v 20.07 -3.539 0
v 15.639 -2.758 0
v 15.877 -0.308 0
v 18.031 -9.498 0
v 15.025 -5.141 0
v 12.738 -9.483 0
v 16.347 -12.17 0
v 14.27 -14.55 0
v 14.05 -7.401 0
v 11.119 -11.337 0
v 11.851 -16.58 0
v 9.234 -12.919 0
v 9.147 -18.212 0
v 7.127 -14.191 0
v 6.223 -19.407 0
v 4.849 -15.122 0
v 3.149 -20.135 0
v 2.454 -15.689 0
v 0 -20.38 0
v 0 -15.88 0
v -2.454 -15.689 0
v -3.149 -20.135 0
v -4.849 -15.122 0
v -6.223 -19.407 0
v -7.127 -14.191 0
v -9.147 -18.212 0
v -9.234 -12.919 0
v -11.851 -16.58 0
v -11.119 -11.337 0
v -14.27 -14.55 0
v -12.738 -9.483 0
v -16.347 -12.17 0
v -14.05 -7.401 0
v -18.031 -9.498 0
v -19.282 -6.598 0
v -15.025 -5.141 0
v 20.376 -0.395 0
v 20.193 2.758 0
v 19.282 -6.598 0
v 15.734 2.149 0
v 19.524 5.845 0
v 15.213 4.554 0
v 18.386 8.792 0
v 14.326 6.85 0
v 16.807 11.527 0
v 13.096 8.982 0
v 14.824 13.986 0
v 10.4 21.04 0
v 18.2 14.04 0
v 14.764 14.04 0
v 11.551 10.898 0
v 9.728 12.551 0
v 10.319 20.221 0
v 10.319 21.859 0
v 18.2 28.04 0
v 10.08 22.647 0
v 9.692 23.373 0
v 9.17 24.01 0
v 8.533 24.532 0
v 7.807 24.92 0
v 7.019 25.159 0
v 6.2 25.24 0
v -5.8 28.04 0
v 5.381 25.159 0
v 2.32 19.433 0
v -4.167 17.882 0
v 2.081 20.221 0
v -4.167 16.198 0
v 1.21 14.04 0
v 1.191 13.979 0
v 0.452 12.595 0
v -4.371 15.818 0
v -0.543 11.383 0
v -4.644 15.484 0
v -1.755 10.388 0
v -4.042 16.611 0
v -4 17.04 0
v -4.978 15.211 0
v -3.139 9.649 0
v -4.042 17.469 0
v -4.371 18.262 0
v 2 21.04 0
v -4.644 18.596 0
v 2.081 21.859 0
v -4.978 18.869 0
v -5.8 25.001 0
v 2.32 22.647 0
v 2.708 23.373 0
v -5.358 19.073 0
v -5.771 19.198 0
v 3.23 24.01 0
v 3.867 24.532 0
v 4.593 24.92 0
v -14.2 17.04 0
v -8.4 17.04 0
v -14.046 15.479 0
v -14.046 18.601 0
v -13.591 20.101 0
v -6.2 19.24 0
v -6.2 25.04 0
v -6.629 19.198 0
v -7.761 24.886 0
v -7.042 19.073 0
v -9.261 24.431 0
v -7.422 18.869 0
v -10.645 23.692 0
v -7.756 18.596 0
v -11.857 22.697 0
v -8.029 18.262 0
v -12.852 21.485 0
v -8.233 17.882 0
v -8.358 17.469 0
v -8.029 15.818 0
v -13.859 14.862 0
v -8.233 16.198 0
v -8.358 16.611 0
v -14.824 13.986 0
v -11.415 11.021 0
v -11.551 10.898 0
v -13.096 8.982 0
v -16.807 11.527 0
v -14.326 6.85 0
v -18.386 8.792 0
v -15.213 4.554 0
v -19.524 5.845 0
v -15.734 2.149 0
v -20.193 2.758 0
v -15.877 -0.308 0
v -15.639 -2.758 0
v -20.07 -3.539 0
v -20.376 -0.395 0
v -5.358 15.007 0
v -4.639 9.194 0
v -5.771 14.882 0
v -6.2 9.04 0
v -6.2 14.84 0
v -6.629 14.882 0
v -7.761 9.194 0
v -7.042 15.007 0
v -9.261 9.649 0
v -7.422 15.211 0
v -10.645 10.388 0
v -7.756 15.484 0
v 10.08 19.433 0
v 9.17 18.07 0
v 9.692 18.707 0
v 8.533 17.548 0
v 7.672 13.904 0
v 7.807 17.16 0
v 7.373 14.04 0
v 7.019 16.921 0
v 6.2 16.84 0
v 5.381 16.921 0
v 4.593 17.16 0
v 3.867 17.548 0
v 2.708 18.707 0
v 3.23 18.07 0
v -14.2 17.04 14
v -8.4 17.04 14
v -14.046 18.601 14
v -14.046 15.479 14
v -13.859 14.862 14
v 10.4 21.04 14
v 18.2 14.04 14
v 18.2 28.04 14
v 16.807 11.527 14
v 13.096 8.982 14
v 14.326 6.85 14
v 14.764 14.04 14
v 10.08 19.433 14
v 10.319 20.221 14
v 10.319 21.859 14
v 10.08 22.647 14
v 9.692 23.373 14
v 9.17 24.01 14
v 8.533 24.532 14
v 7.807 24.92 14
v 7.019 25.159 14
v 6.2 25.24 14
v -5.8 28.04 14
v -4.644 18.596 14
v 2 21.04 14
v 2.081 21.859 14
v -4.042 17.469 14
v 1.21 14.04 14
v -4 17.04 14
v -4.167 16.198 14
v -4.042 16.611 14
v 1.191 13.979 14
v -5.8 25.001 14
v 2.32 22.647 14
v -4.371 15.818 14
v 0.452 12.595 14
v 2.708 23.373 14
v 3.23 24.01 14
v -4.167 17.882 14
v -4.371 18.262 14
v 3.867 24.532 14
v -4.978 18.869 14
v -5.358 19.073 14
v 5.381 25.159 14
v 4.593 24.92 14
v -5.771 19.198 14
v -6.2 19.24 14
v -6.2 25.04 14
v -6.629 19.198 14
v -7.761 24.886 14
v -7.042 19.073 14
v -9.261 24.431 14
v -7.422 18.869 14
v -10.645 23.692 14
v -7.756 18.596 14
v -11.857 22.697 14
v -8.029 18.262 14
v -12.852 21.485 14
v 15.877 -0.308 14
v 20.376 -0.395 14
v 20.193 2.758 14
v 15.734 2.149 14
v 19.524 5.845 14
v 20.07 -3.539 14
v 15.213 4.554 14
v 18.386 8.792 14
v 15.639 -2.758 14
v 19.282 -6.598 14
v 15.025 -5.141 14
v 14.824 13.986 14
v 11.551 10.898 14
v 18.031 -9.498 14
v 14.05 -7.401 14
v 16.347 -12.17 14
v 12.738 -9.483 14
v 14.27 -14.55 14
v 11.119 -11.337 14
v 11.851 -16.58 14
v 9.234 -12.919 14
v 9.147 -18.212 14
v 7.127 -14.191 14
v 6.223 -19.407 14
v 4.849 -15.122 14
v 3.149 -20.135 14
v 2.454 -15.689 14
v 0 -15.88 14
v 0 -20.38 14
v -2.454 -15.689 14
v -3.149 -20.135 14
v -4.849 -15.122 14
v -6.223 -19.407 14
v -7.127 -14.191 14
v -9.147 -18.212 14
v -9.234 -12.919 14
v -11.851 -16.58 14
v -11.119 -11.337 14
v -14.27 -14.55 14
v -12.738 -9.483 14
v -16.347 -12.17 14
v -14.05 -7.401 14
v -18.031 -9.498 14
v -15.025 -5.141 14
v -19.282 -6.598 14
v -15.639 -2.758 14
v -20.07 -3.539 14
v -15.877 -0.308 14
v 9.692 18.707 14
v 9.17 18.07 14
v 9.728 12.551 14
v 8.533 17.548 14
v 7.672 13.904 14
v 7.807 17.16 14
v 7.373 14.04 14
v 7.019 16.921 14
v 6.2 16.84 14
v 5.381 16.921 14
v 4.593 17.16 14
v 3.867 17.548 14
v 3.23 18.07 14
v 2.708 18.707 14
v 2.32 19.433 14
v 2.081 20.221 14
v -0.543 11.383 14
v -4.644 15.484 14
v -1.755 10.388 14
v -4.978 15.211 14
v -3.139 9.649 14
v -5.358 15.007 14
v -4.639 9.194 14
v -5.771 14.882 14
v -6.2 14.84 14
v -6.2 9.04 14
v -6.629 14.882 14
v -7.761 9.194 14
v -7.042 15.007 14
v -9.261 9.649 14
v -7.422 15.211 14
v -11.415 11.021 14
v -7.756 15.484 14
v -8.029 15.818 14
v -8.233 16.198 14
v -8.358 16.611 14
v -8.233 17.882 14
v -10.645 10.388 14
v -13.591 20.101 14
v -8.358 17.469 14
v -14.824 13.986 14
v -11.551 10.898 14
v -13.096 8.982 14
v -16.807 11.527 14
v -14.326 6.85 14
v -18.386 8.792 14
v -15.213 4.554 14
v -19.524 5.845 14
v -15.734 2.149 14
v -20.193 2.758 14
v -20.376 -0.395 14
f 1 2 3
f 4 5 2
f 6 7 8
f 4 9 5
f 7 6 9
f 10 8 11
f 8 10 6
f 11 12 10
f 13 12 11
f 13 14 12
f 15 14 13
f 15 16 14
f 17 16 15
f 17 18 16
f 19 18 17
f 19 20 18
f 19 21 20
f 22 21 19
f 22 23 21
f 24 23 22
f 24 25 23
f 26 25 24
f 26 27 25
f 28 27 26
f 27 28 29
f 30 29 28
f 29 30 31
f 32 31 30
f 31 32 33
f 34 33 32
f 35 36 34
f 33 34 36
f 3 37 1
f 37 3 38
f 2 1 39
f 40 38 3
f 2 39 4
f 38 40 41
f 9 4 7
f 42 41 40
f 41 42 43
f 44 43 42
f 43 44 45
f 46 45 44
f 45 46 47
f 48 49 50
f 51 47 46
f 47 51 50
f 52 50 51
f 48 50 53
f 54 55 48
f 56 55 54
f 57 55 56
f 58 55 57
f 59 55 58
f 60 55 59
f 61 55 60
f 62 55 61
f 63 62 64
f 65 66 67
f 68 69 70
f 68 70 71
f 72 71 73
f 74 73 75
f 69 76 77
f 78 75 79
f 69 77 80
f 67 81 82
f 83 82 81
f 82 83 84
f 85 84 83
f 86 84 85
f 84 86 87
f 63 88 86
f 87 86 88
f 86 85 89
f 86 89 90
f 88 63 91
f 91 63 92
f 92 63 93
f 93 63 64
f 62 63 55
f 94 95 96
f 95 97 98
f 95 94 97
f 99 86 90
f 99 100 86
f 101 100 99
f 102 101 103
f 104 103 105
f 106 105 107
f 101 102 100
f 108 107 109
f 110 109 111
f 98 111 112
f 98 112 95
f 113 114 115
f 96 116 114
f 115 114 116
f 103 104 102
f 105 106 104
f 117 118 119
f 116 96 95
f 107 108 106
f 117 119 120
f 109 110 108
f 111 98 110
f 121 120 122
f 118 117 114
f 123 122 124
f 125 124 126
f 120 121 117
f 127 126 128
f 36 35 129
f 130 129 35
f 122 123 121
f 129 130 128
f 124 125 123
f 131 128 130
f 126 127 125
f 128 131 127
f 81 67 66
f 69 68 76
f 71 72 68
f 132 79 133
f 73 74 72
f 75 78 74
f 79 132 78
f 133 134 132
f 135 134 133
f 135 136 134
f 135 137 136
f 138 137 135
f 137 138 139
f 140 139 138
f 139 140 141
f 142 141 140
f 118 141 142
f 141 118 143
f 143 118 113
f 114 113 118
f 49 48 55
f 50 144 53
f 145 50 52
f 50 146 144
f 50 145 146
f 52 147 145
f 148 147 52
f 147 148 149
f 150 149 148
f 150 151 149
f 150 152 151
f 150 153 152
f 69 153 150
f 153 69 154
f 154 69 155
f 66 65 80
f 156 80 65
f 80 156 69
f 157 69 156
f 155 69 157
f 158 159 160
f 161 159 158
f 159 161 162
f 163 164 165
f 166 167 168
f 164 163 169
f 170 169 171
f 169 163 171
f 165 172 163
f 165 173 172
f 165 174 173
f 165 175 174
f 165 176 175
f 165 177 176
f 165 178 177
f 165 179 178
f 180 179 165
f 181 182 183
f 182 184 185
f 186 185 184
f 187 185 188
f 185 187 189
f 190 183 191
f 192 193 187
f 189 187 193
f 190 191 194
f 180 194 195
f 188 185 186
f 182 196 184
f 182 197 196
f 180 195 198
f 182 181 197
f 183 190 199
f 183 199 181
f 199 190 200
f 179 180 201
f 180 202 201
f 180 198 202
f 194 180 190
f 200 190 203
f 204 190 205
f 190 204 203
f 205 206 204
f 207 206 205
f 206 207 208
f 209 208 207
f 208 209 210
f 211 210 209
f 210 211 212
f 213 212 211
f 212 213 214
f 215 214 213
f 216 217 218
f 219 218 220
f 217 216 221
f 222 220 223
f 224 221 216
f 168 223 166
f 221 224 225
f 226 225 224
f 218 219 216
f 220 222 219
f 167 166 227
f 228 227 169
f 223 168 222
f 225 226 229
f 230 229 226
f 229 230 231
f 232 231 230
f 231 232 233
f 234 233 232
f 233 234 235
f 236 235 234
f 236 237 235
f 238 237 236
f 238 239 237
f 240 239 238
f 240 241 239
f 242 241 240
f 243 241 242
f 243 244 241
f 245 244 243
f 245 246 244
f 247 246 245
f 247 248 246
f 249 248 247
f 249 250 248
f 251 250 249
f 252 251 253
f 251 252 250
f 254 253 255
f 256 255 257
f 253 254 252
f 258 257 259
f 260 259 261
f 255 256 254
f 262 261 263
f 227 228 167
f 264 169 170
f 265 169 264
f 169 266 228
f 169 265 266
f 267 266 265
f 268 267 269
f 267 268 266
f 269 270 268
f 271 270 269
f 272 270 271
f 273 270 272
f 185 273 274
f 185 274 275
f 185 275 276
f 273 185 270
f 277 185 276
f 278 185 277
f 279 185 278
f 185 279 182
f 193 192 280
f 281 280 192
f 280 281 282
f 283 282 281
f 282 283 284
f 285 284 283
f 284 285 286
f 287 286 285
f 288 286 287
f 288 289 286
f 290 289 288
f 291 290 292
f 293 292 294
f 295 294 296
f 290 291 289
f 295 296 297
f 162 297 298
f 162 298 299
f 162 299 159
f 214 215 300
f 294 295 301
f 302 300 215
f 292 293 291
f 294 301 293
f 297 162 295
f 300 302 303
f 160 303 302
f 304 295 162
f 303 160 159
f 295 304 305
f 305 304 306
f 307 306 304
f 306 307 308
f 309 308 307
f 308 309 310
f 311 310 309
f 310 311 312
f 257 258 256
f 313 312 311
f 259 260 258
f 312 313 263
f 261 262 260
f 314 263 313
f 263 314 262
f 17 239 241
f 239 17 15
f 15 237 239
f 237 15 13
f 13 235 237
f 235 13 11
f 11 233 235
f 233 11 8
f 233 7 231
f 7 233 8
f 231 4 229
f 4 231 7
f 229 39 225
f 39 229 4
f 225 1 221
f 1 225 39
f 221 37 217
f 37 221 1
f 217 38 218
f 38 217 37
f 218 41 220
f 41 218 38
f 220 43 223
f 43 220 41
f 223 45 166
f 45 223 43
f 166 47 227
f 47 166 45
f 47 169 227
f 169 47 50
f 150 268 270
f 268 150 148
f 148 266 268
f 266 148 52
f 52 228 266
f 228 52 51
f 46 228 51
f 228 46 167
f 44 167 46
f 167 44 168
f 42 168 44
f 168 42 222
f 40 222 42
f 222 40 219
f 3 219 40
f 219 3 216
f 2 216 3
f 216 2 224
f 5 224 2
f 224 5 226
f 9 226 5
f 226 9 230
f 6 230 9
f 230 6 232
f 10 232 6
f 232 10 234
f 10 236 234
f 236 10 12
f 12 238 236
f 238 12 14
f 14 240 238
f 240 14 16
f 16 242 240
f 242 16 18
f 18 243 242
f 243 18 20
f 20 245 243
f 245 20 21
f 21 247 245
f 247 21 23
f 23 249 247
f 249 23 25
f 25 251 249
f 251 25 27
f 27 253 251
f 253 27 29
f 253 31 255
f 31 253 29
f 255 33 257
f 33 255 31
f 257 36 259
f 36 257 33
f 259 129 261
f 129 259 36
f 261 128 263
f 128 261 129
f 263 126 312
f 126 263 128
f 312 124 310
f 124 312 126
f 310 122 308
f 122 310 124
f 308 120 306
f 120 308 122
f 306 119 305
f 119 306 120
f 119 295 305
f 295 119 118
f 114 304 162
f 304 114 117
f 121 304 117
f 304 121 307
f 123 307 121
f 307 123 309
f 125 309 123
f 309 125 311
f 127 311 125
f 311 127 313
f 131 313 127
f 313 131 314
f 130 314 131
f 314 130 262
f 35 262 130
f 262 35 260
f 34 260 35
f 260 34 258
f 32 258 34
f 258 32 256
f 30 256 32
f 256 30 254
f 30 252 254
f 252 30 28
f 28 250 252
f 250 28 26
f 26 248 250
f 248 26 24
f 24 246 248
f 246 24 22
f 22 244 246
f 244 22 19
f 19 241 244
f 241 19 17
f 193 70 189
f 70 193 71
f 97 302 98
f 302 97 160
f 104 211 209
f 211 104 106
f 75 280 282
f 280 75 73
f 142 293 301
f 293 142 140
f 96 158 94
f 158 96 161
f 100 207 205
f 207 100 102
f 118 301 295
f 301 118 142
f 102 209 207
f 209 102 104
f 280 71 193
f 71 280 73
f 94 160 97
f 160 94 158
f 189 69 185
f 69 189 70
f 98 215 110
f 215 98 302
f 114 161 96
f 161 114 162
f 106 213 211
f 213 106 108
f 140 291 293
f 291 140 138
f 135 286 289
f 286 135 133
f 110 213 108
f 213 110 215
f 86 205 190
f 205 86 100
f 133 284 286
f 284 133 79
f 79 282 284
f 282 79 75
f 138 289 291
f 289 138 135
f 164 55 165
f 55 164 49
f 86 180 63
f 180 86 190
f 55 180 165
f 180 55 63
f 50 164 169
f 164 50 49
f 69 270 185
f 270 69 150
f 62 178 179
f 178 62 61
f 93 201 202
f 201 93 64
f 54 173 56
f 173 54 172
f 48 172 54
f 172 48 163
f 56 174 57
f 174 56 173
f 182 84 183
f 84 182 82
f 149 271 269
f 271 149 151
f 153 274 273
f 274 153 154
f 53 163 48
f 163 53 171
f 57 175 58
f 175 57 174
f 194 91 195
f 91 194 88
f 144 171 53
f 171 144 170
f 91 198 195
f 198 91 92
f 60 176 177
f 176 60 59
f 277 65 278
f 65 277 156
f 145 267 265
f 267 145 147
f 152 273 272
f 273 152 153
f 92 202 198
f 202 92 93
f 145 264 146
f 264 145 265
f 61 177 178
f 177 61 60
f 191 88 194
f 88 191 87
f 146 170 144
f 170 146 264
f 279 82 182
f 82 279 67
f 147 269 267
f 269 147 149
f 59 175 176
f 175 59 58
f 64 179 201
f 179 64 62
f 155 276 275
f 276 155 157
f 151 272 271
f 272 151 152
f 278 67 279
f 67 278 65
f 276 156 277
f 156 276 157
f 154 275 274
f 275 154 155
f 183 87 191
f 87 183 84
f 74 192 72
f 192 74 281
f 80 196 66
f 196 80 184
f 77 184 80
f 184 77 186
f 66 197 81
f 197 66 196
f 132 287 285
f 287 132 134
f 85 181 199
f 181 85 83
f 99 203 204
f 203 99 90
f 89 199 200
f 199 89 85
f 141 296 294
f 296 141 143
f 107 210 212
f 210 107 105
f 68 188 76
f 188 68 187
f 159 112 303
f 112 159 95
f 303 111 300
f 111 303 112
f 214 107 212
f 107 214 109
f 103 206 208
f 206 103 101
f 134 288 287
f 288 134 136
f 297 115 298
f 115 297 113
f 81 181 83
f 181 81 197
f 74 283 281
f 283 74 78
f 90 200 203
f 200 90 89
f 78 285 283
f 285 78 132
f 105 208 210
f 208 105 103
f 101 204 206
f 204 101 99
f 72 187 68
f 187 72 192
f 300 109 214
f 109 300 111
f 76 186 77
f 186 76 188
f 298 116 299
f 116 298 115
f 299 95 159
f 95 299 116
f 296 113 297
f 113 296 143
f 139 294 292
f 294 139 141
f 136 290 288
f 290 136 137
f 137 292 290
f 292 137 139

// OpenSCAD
$fn = 32;

// ----------------------------------------------------------------------
// Pipe clamp: 40.76 mm ring, 4.5 mm wall, 14 mm wide
// ----------------------------------------------------------------------

// --- parameters (mm) ---
outer_r = 20.38;          // clamp outside radius
inner_r = 15.88;          // pipe bore radius
band = 4.5;               // band thickness
clamp_w = 14;             // clamp width
opening = 40;             // opening angle between the ends
lug_w = 24;               // lug width
lug_len = 14;             // lug length
bolt_d = 8.4;             // bolt hole
knuckle_d = 16;           // hinge knuckle diameter
pin_d = 4.4;              // hinge pin hole

clamp_profile = [[-6.97, 19.151], [-9.846, 17.844], [-12.485, 16.108], [-14.824, 13.986], [-16.807, 11.527], [-18.386, 8.792], [-19.524, 5.845], [-20.193, 2.758], [-20.376, -0.395], [-20.07, -3.539], [-19.282, -6.598], [-18.031, -9.498], [-16.347, -12.17], [-14.27, -14.55], [-11.851, -16.58], [-9.147, -18.212], [-6.223, -19.407], [-3.149, -20.135], [0, -20.38], [3.149, -20.135], [6.223, -19.407], [9.147, -18.212], [11.851, -16.58], [14.27, -14.55], [16.347, -12.17], [18.031, -9.498], [19.282, -6.598], [20.07, -3.539], [20.376, -0.395], [20.193, 2.758], [19.524, 5.845], [18.386, 8.792], [16.807, 11.527], [14.824, 13.986], [12.485, 16.108], [9.846, 17.844], [6.97, 19.151], [5.431, 14.922], [7.672, 13.904], [9.728, 12.551], [11.551, 10.898], [13.096, 8.982], [14.326, 6.85], [15.213, 4.554], [15.734, 2.149], [15.877, -0.308], [15.639, -2.758], [15.025, -5.141], [14.05, -7.401], [12.738, -9.483], [11.119, -11.337], [9.234, -12.919], [7.127, -14.191], [4.849, -15.122], [2.454, -15.689], [0, -15.88], [-2.454, -15.689], [-4.849, -15.122], [-7.127, -14.191], [-9.234, -12.919], [-11.119, -11.337], [-12.738, -9.483], [-14.05, -7.401], [-15.025, -5.141], [-15.639, -2.758], [-15.877, -0.308], [-15.734, 2.149], [-15.213, 4.554], [-14.326, 6.85], [-13.096, 8.982], [-11.551, 10.898], [-9.728, 12.551], [-7.672, 13.904], [-5.431, 14.922]];

difference() {
  union() {
    linear_extrude(height = clamp_w) polygon(clamp_profile);
    /* hinge knuckle, sunk 2 mm into the band end */
    translate([-6.2, 17.04, 0]) cylinder(h = clamp_w, d = knuckle_d);
    /* bolt lug on the other end */
    translate([-5.8, 14.04, 0]) cube([lug_w, 14, clamp_w]);
  }
  translate([6.2, 21.04, -2.5]) cylinder(h = clamp_w + 5, d = bolt_d);
  translate([-6.2, 17.04, -2.5]) cylinder(h = clamp_w + 5, d = pin_d);
}
